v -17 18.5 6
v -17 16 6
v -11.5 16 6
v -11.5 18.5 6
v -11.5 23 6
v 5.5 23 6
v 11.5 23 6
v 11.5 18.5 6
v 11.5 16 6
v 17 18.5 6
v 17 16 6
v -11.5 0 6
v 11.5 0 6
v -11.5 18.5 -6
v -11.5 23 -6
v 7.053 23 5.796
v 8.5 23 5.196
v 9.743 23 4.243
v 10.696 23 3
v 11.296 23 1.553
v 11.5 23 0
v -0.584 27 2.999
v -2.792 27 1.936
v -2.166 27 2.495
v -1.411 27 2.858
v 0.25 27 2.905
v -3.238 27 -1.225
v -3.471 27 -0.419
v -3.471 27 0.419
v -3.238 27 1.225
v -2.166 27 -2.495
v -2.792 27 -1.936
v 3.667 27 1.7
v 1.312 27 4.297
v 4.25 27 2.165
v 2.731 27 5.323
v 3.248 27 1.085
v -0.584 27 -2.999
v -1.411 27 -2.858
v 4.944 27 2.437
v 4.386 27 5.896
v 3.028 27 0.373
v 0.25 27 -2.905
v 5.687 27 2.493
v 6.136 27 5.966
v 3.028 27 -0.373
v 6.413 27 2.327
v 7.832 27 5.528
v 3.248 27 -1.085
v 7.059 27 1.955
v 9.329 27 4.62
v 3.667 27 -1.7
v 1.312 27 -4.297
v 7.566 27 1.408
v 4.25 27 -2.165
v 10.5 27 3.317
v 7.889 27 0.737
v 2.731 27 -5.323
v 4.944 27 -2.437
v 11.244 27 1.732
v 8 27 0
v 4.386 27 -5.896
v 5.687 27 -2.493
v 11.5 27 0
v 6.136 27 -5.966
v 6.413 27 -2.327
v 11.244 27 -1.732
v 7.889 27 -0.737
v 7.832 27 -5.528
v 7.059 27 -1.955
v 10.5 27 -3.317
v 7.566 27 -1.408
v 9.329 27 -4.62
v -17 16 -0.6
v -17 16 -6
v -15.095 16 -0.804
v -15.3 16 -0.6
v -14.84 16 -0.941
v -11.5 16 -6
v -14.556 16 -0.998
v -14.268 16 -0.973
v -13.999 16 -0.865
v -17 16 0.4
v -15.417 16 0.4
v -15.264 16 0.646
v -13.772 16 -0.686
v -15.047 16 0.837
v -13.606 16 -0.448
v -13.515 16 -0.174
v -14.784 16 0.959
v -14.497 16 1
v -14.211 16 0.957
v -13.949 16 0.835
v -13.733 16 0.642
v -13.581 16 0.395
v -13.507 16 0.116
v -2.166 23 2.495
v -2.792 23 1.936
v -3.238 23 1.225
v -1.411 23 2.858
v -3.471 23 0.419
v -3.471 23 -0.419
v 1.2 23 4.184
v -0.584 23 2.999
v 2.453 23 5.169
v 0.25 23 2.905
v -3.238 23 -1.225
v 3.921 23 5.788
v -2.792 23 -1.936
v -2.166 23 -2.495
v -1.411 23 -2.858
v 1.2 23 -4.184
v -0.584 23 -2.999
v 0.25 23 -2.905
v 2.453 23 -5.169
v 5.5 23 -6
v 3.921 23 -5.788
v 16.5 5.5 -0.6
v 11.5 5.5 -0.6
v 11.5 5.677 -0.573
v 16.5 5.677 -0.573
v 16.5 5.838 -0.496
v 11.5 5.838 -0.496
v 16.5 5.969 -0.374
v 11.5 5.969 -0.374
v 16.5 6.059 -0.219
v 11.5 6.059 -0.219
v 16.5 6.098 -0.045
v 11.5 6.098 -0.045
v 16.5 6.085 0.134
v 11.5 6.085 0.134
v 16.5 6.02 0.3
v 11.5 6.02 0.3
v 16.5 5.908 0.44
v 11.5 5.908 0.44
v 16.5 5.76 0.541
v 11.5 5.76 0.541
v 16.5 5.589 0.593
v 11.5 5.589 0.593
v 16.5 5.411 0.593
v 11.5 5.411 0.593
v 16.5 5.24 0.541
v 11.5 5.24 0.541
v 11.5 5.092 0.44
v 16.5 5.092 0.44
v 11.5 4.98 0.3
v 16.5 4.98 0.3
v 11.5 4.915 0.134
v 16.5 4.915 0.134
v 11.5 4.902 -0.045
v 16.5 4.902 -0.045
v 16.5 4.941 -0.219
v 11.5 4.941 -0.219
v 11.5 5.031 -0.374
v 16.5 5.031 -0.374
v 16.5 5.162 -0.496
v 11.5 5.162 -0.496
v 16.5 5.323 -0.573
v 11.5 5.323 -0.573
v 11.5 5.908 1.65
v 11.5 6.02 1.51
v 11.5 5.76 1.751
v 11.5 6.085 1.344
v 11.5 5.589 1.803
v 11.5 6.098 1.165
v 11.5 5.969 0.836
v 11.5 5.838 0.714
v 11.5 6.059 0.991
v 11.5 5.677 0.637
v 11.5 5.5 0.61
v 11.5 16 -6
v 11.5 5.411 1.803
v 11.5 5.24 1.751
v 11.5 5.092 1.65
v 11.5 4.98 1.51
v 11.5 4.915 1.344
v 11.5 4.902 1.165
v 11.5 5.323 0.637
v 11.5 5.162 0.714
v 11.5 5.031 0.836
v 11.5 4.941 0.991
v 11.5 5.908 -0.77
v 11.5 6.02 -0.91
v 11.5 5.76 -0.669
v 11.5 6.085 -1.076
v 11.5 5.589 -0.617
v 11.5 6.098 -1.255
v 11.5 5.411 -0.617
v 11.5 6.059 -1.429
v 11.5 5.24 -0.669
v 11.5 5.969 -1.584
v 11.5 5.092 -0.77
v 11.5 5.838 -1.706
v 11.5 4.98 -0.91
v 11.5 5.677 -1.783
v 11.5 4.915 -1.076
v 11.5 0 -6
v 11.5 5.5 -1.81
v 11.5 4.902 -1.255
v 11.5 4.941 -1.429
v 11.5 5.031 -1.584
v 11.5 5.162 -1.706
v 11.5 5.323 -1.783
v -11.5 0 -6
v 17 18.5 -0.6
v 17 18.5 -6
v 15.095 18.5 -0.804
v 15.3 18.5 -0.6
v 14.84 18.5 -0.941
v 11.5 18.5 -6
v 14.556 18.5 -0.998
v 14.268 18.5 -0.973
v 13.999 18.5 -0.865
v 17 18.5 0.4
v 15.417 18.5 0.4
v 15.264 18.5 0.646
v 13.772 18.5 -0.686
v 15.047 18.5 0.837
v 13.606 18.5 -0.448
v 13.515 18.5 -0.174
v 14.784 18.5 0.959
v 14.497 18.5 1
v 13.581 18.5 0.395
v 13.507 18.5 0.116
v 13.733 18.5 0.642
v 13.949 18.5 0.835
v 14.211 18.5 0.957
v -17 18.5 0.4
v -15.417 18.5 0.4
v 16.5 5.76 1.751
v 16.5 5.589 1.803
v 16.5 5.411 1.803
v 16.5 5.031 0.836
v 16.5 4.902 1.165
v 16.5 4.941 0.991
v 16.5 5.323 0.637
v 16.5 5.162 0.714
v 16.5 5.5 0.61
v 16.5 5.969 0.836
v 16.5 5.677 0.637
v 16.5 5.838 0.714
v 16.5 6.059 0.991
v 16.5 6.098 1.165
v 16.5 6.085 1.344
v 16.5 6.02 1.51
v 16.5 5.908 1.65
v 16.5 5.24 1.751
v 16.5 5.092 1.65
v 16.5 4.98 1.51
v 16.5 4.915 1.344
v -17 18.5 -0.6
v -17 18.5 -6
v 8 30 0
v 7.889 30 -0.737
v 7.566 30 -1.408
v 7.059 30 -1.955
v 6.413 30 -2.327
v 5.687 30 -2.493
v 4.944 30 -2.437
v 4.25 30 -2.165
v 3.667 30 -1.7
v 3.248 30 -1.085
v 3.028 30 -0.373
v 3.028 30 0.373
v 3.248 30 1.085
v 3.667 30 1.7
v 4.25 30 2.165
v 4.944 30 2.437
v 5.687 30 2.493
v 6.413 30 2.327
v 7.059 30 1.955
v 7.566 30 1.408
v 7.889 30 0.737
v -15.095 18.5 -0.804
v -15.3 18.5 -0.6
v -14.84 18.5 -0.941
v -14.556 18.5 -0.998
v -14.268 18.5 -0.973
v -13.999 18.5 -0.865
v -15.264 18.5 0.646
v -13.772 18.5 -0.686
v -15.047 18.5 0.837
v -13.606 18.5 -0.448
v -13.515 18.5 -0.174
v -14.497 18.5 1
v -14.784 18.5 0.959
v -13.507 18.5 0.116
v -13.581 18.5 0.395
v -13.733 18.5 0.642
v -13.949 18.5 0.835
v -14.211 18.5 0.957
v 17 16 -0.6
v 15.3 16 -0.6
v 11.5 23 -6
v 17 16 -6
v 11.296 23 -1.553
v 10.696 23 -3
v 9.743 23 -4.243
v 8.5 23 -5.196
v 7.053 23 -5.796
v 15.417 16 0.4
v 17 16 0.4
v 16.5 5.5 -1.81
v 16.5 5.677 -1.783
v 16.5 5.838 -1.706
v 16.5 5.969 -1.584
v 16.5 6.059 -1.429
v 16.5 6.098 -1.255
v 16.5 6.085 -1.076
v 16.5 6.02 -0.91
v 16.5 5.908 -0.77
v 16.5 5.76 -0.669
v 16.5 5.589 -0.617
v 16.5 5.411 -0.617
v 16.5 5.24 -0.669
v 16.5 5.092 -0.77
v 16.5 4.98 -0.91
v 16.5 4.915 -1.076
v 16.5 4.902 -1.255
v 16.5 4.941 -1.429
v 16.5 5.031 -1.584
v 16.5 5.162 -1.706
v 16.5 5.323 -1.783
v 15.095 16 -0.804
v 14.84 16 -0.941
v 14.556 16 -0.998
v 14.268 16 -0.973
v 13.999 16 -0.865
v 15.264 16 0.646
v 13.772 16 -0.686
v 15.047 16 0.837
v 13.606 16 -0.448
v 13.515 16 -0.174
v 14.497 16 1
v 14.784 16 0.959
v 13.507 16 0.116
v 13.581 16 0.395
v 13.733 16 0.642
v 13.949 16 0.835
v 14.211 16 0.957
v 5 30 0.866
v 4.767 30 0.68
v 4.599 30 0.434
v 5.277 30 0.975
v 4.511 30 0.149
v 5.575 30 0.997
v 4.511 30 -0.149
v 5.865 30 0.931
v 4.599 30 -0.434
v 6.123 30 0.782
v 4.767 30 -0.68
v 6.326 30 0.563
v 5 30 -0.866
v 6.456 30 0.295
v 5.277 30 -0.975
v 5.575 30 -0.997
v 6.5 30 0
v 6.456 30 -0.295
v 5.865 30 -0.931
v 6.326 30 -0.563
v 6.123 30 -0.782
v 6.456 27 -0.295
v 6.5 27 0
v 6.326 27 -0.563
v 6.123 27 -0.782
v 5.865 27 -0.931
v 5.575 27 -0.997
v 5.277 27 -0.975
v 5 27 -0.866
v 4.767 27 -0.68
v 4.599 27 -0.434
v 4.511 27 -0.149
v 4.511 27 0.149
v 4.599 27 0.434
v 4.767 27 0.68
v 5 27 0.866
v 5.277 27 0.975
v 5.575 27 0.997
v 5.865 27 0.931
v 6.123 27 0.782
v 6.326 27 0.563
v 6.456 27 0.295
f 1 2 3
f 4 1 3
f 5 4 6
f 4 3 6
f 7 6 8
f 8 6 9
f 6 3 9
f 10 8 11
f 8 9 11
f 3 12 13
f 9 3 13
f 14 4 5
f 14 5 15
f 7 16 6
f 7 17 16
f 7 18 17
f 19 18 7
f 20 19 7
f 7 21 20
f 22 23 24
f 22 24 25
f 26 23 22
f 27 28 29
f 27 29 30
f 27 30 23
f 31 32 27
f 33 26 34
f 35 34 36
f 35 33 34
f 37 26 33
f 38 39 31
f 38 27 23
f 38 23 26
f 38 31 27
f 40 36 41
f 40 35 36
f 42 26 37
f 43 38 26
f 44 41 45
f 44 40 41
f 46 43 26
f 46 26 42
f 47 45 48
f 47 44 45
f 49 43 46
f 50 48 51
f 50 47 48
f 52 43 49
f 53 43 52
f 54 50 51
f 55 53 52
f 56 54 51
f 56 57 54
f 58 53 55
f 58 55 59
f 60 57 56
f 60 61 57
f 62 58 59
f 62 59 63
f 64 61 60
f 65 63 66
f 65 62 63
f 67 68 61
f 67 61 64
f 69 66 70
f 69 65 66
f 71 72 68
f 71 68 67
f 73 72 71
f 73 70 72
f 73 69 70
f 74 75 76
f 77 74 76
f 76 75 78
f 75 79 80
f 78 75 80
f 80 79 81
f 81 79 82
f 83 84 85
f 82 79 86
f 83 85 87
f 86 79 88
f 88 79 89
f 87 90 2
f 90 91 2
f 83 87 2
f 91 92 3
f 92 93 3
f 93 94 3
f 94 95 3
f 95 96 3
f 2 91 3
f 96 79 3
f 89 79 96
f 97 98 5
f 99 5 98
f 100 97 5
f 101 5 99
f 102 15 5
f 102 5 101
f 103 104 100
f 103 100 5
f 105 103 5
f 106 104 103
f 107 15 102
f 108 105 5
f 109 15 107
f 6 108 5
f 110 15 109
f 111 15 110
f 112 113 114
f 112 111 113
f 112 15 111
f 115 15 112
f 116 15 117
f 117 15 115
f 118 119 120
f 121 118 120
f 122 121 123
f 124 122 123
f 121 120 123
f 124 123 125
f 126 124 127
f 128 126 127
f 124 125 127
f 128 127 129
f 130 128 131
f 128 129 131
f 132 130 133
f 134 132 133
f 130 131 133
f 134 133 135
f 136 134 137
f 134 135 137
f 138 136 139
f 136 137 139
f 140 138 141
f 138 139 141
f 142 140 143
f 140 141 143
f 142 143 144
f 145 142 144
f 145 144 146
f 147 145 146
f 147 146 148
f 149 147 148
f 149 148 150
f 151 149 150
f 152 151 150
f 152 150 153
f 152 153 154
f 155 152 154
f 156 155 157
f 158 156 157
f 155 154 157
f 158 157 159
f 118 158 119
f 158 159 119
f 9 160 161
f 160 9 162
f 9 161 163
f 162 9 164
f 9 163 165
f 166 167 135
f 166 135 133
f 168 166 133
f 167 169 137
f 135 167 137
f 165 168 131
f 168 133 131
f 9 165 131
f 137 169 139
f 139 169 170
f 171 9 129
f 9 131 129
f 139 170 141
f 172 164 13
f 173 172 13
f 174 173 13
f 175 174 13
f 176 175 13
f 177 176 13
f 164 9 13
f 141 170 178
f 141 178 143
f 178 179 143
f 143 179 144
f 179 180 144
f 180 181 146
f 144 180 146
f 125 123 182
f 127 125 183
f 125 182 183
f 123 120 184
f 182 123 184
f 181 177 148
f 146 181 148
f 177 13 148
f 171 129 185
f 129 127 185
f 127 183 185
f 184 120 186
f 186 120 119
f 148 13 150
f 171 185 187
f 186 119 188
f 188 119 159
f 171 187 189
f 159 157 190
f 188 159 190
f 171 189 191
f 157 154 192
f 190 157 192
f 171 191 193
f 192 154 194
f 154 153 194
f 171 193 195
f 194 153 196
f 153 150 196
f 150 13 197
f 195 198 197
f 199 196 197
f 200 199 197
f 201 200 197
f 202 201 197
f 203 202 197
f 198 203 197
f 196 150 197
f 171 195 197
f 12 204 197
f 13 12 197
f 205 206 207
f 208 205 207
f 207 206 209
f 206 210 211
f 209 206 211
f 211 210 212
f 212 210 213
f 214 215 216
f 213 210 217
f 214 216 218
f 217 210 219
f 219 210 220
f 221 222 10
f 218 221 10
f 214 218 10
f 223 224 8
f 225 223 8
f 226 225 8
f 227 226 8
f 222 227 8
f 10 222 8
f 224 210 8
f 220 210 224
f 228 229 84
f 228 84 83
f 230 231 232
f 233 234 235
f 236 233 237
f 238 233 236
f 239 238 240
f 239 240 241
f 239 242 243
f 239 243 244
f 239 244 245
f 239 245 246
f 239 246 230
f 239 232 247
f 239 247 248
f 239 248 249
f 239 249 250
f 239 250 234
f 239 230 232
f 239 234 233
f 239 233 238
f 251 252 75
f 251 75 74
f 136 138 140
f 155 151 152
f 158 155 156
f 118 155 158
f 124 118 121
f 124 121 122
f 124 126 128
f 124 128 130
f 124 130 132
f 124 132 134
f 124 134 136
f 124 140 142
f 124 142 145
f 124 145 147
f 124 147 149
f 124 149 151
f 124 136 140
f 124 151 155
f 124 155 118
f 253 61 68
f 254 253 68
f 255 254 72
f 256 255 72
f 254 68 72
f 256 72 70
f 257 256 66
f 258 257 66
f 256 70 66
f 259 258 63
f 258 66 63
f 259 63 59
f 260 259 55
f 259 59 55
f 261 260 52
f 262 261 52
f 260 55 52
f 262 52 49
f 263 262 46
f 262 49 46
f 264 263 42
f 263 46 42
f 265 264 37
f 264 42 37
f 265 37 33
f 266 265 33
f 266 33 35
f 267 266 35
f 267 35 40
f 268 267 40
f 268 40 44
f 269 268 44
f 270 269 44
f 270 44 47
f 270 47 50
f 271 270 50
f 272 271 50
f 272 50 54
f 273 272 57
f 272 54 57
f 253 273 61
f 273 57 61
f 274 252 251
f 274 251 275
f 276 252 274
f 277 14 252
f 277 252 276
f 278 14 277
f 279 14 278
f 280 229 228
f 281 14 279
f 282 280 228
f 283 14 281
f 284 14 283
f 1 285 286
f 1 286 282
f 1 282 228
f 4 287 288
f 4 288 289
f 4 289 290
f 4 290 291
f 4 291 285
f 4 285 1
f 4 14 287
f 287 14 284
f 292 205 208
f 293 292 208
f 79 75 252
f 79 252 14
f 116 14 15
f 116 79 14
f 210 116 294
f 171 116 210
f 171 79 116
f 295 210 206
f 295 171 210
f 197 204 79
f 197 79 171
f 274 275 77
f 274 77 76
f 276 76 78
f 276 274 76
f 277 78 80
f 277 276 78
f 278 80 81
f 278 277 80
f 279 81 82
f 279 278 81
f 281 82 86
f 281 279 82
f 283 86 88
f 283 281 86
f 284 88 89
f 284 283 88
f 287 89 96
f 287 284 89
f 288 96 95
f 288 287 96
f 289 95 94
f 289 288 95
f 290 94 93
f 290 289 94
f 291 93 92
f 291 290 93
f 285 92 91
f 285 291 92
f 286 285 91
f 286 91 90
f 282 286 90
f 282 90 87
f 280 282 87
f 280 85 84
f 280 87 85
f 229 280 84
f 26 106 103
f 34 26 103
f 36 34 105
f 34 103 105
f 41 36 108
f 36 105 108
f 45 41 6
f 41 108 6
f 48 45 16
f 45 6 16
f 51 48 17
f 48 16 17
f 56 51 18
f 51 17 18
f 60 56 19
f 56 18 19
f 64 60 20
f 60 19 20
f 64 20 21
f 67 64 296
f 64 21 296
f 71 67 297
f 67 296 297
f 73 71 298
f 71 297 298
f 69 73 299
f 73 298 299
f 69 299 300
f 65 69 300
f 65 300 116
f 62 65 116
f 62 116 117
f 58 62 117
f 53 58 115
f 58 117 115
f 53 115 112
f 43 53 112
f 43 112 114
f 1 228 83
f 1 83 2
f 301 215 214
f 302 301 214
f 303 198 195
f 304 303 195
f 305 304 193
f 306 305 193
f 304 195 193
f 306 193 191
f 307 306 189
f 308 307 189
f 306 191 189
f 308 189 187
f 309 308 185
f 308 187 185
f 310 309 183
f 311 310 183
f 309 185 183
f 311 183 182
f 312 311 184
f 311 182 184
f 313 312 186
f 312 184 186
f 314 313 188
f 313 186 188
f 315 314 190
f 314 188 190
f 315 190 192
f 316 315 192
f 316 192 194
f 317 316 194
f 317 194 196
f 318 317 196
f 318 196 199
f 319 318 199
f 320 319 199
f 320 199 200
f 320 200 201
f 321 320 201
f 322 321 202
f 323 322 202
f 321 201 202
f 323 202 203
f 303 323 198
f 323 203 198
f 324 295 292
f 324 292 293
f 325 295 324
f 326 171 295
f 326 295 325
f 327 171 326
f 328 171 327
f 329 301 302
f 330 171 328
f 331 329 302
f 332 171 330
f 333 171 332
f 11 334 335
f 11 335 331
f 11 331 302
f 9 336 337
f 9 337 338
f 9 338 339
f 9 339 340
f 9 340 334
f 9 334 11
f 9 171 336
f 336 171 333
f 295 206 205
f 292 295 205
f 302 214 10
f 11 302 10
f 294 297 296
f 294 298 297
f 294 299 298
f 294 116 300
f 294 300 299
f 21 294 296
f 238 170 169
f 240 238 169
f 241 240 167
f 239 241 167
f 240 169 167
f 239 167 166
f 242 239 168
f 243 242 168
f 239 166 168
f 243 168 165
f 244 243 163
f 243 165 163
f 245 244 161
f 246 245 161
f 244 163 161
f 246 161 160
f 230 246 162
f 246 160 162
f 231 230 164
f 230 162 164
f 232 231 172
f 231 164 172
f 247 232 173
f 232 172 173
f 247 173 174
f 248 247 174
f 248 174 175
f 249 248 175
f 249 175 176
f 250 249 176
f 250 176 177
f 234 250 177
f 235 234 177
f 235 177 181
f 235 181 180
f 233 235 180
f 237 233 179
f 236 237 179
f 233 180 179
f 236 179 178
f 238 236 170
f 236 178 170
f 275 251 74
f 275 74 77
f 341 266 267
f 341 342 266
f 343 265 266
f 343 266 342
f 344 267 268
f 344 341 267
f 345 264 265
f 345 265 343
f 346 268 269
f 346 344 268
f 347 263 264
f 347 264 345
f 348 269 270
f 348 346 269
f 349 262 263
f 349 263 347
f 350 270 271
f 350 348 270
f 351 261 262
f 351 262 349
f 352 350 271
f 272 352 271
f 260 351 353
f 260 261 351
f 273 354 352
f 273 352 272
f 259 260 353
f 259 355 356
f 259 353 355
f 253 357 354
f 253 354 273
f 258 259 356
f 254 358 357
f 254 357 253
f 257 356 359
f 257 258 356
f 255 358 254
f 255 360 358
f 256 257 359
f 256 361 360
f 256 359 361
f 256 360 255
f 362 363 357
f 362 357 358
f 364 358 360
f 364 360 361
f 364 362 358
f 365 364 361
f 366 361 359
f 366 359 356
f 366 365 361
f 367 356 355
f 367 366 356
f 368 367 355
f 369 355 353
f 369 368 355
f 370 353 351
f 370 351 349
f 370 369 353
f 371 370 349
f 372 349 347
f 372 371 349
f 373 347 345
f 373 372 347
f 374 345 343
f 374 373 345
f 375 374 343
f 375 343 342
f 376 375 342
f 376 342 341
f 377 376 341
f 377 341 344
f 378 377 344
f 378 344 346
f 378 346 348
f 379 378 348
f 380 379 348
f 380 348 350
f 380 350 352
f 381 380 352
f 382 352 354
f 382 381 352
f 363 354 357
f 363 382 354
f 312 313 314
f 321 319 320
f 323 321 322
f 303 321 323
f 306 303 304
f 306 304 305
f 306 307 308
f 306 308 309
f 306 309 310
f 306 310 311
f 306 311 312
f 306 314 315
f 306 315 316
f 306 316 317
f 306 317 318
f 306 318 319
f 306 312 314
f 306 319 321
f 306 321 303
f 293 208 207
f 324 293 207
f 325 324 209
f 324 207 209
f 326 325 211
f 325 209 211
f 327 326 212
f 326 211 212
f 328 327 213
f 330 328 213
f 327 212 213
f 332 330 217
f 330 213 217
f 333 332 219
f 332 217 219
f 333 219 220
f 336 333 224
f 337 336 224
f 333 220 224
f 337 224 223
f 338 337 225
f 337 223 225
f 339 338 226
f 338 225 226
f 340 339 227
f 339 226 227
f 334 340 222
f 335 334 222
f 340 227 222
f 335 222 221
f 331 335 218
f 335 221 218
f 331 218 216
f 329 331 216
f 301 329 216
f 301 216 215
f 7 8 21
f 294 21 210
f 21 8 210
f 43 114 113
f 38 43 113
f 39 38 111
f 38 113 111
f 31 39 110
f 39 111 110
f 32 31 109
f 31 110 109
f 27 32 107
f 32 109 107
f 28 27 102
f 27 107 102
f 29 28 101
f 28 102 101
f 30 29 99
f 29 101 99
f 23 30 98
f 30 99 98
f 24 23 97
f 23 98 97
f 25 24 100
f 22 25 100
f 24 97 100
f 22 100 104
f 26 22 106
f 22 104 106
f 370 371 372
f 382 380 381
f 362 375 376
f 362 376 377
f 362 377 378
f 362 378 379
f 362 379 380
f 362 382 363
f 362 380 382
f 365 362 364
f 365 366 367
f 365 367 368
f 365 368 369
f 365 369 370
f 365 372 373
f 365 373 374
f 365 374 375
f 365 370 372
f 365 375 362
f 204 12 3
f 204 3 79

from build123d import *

# Parameters (mm, degrees)
SKETCH1_W           = 23
SKETCH1_H           = 12
BOSS_EXTRUDE1_DEPTH = 23
SKETCH2_W           = 12
SKETCH2_H           = 2.5
BOSS_EXTRUDE2_DEPTH = 5.5
CUT_EXTRUDE1_DEPTH  = 5
BOSS_EXTRUDE3_DEPTH = 4
SKETCH5_R           = 2.5
SKETCH5_R_2         = 1
BOSS_EXTRUDE4_DEPTH = 3
SKETCH7_R           = 0.6
BOSS_EXTRUDE8_DEPTH = 5


with BuildPart() as part:
    # Sketch1 → Boss-Extrude1 (new body)
    with BuildSketch(Plane(origin=(0, 0, 0), x_dir=(1, 0, 0), z_dir=(0, 1, 0))):
        Rectangle(SKETCH1_W, SKETCH1_H)
    extrude(amount=BOSS_EXTRUDE1_DEPTH)

    # Sketch2 → Boss-Extrude2 (add)
    with BuildSketch(Plane.ZY.offset(11.5)):
        with Locations((0, 17.25)):
            Rectangle(SKETCH2_W, SKETCH2_H)
    boss_extrude2 = extrude(amount=BOSS_EXTRUDE2_DEPTH)

    # Sketch3 → Cut-Extrude1 (cut)
    with BuildSketch(Plane(origin=(0, 18.5, 0), x_dir=(1, 0, 0), z_dir=(0, 1, 0))):
        with BuildLine():
            Line((-17, 0.6), (-15.3, 0.6))
            ThreePointArc((-15.3, 0.6), (-13.506719548, -0.11573221), (-15.416515139, -0.4))
            Line((-15.416515139, -0.4), (-17, -0.4))
            Line((-17, -0.4), (-17, 0.6))
        make_face()
    cut_extrude1 = extrude(amount=-CUT_EXTRUDE1_DEPTH, mode=Mode.SUBTRACT)

    # Mirror1: Boss-Extrude2, Cut-Extrude1 across plane
    add(boss_extrude2.mirror(Plane(origin=(0, 0, 0), x_dir=(0, 0, 1), z_dir=(1, 0, 0))))
    add(cut_extrude1.mirror(Plane(origin=(0, 0, 0), x_dir=(0, 0, 1), z_dir=(1, 0, 0))), mode=Mode.SUBTRACT)

    # Sketch4 → Boss-Extrude3 (add)
    with BuildSketch(Plane(origin=(0, 23, 0), x_dir=(1, 0, 0), z_dir=(0, 1, 0))):
        with BuildLine():
            ThreePointArc((0.25, -2.90473751), (11.5, 0), (0.25, 2.90473751))
            ThreePointArc((0.25, 2.90473751), (-3.5, 0), (0.25, -2.90473751))
        make_face()
    extrude(amount=BOSS_EXTRUDE3_DEPTH)

    # Sketch5 → Boss-Extrude4 (add)
    with BuildSketch(Plane(origin=(0, 27, 0), x_dir=(1, 0, 0), z_dir=(0, 1, 0))):
        with Locations((5.5, 0)):
            Circle(SKETCH5_R)
        with Locations((5.5, 0)):
            Circle(SKETCH5_R_2, mode=Mode.SUBTRACT)
    extrude(amount=BOSS_EXTRUDE4_DEPTH)

    # Sketch7 → Boss-Extrude8 (add)
    with BuildSketch(Plane(origin=(11.5, 0, 0), x_dir=(0, 0, -1), z_dir=(1, 0, 0))):
        with Locations((0, 5.5)):
            Circle(SKETCH7_R)
        with Locations((1.21, 5.5)):
            Circle(SKETCH7_R)
        with Locations((-1.21, 5.5)):
            Circle(SKETCH7_R)
    extrude(amount=BOSS_EXTRUDE8_DEPTH)


solid = part.part
